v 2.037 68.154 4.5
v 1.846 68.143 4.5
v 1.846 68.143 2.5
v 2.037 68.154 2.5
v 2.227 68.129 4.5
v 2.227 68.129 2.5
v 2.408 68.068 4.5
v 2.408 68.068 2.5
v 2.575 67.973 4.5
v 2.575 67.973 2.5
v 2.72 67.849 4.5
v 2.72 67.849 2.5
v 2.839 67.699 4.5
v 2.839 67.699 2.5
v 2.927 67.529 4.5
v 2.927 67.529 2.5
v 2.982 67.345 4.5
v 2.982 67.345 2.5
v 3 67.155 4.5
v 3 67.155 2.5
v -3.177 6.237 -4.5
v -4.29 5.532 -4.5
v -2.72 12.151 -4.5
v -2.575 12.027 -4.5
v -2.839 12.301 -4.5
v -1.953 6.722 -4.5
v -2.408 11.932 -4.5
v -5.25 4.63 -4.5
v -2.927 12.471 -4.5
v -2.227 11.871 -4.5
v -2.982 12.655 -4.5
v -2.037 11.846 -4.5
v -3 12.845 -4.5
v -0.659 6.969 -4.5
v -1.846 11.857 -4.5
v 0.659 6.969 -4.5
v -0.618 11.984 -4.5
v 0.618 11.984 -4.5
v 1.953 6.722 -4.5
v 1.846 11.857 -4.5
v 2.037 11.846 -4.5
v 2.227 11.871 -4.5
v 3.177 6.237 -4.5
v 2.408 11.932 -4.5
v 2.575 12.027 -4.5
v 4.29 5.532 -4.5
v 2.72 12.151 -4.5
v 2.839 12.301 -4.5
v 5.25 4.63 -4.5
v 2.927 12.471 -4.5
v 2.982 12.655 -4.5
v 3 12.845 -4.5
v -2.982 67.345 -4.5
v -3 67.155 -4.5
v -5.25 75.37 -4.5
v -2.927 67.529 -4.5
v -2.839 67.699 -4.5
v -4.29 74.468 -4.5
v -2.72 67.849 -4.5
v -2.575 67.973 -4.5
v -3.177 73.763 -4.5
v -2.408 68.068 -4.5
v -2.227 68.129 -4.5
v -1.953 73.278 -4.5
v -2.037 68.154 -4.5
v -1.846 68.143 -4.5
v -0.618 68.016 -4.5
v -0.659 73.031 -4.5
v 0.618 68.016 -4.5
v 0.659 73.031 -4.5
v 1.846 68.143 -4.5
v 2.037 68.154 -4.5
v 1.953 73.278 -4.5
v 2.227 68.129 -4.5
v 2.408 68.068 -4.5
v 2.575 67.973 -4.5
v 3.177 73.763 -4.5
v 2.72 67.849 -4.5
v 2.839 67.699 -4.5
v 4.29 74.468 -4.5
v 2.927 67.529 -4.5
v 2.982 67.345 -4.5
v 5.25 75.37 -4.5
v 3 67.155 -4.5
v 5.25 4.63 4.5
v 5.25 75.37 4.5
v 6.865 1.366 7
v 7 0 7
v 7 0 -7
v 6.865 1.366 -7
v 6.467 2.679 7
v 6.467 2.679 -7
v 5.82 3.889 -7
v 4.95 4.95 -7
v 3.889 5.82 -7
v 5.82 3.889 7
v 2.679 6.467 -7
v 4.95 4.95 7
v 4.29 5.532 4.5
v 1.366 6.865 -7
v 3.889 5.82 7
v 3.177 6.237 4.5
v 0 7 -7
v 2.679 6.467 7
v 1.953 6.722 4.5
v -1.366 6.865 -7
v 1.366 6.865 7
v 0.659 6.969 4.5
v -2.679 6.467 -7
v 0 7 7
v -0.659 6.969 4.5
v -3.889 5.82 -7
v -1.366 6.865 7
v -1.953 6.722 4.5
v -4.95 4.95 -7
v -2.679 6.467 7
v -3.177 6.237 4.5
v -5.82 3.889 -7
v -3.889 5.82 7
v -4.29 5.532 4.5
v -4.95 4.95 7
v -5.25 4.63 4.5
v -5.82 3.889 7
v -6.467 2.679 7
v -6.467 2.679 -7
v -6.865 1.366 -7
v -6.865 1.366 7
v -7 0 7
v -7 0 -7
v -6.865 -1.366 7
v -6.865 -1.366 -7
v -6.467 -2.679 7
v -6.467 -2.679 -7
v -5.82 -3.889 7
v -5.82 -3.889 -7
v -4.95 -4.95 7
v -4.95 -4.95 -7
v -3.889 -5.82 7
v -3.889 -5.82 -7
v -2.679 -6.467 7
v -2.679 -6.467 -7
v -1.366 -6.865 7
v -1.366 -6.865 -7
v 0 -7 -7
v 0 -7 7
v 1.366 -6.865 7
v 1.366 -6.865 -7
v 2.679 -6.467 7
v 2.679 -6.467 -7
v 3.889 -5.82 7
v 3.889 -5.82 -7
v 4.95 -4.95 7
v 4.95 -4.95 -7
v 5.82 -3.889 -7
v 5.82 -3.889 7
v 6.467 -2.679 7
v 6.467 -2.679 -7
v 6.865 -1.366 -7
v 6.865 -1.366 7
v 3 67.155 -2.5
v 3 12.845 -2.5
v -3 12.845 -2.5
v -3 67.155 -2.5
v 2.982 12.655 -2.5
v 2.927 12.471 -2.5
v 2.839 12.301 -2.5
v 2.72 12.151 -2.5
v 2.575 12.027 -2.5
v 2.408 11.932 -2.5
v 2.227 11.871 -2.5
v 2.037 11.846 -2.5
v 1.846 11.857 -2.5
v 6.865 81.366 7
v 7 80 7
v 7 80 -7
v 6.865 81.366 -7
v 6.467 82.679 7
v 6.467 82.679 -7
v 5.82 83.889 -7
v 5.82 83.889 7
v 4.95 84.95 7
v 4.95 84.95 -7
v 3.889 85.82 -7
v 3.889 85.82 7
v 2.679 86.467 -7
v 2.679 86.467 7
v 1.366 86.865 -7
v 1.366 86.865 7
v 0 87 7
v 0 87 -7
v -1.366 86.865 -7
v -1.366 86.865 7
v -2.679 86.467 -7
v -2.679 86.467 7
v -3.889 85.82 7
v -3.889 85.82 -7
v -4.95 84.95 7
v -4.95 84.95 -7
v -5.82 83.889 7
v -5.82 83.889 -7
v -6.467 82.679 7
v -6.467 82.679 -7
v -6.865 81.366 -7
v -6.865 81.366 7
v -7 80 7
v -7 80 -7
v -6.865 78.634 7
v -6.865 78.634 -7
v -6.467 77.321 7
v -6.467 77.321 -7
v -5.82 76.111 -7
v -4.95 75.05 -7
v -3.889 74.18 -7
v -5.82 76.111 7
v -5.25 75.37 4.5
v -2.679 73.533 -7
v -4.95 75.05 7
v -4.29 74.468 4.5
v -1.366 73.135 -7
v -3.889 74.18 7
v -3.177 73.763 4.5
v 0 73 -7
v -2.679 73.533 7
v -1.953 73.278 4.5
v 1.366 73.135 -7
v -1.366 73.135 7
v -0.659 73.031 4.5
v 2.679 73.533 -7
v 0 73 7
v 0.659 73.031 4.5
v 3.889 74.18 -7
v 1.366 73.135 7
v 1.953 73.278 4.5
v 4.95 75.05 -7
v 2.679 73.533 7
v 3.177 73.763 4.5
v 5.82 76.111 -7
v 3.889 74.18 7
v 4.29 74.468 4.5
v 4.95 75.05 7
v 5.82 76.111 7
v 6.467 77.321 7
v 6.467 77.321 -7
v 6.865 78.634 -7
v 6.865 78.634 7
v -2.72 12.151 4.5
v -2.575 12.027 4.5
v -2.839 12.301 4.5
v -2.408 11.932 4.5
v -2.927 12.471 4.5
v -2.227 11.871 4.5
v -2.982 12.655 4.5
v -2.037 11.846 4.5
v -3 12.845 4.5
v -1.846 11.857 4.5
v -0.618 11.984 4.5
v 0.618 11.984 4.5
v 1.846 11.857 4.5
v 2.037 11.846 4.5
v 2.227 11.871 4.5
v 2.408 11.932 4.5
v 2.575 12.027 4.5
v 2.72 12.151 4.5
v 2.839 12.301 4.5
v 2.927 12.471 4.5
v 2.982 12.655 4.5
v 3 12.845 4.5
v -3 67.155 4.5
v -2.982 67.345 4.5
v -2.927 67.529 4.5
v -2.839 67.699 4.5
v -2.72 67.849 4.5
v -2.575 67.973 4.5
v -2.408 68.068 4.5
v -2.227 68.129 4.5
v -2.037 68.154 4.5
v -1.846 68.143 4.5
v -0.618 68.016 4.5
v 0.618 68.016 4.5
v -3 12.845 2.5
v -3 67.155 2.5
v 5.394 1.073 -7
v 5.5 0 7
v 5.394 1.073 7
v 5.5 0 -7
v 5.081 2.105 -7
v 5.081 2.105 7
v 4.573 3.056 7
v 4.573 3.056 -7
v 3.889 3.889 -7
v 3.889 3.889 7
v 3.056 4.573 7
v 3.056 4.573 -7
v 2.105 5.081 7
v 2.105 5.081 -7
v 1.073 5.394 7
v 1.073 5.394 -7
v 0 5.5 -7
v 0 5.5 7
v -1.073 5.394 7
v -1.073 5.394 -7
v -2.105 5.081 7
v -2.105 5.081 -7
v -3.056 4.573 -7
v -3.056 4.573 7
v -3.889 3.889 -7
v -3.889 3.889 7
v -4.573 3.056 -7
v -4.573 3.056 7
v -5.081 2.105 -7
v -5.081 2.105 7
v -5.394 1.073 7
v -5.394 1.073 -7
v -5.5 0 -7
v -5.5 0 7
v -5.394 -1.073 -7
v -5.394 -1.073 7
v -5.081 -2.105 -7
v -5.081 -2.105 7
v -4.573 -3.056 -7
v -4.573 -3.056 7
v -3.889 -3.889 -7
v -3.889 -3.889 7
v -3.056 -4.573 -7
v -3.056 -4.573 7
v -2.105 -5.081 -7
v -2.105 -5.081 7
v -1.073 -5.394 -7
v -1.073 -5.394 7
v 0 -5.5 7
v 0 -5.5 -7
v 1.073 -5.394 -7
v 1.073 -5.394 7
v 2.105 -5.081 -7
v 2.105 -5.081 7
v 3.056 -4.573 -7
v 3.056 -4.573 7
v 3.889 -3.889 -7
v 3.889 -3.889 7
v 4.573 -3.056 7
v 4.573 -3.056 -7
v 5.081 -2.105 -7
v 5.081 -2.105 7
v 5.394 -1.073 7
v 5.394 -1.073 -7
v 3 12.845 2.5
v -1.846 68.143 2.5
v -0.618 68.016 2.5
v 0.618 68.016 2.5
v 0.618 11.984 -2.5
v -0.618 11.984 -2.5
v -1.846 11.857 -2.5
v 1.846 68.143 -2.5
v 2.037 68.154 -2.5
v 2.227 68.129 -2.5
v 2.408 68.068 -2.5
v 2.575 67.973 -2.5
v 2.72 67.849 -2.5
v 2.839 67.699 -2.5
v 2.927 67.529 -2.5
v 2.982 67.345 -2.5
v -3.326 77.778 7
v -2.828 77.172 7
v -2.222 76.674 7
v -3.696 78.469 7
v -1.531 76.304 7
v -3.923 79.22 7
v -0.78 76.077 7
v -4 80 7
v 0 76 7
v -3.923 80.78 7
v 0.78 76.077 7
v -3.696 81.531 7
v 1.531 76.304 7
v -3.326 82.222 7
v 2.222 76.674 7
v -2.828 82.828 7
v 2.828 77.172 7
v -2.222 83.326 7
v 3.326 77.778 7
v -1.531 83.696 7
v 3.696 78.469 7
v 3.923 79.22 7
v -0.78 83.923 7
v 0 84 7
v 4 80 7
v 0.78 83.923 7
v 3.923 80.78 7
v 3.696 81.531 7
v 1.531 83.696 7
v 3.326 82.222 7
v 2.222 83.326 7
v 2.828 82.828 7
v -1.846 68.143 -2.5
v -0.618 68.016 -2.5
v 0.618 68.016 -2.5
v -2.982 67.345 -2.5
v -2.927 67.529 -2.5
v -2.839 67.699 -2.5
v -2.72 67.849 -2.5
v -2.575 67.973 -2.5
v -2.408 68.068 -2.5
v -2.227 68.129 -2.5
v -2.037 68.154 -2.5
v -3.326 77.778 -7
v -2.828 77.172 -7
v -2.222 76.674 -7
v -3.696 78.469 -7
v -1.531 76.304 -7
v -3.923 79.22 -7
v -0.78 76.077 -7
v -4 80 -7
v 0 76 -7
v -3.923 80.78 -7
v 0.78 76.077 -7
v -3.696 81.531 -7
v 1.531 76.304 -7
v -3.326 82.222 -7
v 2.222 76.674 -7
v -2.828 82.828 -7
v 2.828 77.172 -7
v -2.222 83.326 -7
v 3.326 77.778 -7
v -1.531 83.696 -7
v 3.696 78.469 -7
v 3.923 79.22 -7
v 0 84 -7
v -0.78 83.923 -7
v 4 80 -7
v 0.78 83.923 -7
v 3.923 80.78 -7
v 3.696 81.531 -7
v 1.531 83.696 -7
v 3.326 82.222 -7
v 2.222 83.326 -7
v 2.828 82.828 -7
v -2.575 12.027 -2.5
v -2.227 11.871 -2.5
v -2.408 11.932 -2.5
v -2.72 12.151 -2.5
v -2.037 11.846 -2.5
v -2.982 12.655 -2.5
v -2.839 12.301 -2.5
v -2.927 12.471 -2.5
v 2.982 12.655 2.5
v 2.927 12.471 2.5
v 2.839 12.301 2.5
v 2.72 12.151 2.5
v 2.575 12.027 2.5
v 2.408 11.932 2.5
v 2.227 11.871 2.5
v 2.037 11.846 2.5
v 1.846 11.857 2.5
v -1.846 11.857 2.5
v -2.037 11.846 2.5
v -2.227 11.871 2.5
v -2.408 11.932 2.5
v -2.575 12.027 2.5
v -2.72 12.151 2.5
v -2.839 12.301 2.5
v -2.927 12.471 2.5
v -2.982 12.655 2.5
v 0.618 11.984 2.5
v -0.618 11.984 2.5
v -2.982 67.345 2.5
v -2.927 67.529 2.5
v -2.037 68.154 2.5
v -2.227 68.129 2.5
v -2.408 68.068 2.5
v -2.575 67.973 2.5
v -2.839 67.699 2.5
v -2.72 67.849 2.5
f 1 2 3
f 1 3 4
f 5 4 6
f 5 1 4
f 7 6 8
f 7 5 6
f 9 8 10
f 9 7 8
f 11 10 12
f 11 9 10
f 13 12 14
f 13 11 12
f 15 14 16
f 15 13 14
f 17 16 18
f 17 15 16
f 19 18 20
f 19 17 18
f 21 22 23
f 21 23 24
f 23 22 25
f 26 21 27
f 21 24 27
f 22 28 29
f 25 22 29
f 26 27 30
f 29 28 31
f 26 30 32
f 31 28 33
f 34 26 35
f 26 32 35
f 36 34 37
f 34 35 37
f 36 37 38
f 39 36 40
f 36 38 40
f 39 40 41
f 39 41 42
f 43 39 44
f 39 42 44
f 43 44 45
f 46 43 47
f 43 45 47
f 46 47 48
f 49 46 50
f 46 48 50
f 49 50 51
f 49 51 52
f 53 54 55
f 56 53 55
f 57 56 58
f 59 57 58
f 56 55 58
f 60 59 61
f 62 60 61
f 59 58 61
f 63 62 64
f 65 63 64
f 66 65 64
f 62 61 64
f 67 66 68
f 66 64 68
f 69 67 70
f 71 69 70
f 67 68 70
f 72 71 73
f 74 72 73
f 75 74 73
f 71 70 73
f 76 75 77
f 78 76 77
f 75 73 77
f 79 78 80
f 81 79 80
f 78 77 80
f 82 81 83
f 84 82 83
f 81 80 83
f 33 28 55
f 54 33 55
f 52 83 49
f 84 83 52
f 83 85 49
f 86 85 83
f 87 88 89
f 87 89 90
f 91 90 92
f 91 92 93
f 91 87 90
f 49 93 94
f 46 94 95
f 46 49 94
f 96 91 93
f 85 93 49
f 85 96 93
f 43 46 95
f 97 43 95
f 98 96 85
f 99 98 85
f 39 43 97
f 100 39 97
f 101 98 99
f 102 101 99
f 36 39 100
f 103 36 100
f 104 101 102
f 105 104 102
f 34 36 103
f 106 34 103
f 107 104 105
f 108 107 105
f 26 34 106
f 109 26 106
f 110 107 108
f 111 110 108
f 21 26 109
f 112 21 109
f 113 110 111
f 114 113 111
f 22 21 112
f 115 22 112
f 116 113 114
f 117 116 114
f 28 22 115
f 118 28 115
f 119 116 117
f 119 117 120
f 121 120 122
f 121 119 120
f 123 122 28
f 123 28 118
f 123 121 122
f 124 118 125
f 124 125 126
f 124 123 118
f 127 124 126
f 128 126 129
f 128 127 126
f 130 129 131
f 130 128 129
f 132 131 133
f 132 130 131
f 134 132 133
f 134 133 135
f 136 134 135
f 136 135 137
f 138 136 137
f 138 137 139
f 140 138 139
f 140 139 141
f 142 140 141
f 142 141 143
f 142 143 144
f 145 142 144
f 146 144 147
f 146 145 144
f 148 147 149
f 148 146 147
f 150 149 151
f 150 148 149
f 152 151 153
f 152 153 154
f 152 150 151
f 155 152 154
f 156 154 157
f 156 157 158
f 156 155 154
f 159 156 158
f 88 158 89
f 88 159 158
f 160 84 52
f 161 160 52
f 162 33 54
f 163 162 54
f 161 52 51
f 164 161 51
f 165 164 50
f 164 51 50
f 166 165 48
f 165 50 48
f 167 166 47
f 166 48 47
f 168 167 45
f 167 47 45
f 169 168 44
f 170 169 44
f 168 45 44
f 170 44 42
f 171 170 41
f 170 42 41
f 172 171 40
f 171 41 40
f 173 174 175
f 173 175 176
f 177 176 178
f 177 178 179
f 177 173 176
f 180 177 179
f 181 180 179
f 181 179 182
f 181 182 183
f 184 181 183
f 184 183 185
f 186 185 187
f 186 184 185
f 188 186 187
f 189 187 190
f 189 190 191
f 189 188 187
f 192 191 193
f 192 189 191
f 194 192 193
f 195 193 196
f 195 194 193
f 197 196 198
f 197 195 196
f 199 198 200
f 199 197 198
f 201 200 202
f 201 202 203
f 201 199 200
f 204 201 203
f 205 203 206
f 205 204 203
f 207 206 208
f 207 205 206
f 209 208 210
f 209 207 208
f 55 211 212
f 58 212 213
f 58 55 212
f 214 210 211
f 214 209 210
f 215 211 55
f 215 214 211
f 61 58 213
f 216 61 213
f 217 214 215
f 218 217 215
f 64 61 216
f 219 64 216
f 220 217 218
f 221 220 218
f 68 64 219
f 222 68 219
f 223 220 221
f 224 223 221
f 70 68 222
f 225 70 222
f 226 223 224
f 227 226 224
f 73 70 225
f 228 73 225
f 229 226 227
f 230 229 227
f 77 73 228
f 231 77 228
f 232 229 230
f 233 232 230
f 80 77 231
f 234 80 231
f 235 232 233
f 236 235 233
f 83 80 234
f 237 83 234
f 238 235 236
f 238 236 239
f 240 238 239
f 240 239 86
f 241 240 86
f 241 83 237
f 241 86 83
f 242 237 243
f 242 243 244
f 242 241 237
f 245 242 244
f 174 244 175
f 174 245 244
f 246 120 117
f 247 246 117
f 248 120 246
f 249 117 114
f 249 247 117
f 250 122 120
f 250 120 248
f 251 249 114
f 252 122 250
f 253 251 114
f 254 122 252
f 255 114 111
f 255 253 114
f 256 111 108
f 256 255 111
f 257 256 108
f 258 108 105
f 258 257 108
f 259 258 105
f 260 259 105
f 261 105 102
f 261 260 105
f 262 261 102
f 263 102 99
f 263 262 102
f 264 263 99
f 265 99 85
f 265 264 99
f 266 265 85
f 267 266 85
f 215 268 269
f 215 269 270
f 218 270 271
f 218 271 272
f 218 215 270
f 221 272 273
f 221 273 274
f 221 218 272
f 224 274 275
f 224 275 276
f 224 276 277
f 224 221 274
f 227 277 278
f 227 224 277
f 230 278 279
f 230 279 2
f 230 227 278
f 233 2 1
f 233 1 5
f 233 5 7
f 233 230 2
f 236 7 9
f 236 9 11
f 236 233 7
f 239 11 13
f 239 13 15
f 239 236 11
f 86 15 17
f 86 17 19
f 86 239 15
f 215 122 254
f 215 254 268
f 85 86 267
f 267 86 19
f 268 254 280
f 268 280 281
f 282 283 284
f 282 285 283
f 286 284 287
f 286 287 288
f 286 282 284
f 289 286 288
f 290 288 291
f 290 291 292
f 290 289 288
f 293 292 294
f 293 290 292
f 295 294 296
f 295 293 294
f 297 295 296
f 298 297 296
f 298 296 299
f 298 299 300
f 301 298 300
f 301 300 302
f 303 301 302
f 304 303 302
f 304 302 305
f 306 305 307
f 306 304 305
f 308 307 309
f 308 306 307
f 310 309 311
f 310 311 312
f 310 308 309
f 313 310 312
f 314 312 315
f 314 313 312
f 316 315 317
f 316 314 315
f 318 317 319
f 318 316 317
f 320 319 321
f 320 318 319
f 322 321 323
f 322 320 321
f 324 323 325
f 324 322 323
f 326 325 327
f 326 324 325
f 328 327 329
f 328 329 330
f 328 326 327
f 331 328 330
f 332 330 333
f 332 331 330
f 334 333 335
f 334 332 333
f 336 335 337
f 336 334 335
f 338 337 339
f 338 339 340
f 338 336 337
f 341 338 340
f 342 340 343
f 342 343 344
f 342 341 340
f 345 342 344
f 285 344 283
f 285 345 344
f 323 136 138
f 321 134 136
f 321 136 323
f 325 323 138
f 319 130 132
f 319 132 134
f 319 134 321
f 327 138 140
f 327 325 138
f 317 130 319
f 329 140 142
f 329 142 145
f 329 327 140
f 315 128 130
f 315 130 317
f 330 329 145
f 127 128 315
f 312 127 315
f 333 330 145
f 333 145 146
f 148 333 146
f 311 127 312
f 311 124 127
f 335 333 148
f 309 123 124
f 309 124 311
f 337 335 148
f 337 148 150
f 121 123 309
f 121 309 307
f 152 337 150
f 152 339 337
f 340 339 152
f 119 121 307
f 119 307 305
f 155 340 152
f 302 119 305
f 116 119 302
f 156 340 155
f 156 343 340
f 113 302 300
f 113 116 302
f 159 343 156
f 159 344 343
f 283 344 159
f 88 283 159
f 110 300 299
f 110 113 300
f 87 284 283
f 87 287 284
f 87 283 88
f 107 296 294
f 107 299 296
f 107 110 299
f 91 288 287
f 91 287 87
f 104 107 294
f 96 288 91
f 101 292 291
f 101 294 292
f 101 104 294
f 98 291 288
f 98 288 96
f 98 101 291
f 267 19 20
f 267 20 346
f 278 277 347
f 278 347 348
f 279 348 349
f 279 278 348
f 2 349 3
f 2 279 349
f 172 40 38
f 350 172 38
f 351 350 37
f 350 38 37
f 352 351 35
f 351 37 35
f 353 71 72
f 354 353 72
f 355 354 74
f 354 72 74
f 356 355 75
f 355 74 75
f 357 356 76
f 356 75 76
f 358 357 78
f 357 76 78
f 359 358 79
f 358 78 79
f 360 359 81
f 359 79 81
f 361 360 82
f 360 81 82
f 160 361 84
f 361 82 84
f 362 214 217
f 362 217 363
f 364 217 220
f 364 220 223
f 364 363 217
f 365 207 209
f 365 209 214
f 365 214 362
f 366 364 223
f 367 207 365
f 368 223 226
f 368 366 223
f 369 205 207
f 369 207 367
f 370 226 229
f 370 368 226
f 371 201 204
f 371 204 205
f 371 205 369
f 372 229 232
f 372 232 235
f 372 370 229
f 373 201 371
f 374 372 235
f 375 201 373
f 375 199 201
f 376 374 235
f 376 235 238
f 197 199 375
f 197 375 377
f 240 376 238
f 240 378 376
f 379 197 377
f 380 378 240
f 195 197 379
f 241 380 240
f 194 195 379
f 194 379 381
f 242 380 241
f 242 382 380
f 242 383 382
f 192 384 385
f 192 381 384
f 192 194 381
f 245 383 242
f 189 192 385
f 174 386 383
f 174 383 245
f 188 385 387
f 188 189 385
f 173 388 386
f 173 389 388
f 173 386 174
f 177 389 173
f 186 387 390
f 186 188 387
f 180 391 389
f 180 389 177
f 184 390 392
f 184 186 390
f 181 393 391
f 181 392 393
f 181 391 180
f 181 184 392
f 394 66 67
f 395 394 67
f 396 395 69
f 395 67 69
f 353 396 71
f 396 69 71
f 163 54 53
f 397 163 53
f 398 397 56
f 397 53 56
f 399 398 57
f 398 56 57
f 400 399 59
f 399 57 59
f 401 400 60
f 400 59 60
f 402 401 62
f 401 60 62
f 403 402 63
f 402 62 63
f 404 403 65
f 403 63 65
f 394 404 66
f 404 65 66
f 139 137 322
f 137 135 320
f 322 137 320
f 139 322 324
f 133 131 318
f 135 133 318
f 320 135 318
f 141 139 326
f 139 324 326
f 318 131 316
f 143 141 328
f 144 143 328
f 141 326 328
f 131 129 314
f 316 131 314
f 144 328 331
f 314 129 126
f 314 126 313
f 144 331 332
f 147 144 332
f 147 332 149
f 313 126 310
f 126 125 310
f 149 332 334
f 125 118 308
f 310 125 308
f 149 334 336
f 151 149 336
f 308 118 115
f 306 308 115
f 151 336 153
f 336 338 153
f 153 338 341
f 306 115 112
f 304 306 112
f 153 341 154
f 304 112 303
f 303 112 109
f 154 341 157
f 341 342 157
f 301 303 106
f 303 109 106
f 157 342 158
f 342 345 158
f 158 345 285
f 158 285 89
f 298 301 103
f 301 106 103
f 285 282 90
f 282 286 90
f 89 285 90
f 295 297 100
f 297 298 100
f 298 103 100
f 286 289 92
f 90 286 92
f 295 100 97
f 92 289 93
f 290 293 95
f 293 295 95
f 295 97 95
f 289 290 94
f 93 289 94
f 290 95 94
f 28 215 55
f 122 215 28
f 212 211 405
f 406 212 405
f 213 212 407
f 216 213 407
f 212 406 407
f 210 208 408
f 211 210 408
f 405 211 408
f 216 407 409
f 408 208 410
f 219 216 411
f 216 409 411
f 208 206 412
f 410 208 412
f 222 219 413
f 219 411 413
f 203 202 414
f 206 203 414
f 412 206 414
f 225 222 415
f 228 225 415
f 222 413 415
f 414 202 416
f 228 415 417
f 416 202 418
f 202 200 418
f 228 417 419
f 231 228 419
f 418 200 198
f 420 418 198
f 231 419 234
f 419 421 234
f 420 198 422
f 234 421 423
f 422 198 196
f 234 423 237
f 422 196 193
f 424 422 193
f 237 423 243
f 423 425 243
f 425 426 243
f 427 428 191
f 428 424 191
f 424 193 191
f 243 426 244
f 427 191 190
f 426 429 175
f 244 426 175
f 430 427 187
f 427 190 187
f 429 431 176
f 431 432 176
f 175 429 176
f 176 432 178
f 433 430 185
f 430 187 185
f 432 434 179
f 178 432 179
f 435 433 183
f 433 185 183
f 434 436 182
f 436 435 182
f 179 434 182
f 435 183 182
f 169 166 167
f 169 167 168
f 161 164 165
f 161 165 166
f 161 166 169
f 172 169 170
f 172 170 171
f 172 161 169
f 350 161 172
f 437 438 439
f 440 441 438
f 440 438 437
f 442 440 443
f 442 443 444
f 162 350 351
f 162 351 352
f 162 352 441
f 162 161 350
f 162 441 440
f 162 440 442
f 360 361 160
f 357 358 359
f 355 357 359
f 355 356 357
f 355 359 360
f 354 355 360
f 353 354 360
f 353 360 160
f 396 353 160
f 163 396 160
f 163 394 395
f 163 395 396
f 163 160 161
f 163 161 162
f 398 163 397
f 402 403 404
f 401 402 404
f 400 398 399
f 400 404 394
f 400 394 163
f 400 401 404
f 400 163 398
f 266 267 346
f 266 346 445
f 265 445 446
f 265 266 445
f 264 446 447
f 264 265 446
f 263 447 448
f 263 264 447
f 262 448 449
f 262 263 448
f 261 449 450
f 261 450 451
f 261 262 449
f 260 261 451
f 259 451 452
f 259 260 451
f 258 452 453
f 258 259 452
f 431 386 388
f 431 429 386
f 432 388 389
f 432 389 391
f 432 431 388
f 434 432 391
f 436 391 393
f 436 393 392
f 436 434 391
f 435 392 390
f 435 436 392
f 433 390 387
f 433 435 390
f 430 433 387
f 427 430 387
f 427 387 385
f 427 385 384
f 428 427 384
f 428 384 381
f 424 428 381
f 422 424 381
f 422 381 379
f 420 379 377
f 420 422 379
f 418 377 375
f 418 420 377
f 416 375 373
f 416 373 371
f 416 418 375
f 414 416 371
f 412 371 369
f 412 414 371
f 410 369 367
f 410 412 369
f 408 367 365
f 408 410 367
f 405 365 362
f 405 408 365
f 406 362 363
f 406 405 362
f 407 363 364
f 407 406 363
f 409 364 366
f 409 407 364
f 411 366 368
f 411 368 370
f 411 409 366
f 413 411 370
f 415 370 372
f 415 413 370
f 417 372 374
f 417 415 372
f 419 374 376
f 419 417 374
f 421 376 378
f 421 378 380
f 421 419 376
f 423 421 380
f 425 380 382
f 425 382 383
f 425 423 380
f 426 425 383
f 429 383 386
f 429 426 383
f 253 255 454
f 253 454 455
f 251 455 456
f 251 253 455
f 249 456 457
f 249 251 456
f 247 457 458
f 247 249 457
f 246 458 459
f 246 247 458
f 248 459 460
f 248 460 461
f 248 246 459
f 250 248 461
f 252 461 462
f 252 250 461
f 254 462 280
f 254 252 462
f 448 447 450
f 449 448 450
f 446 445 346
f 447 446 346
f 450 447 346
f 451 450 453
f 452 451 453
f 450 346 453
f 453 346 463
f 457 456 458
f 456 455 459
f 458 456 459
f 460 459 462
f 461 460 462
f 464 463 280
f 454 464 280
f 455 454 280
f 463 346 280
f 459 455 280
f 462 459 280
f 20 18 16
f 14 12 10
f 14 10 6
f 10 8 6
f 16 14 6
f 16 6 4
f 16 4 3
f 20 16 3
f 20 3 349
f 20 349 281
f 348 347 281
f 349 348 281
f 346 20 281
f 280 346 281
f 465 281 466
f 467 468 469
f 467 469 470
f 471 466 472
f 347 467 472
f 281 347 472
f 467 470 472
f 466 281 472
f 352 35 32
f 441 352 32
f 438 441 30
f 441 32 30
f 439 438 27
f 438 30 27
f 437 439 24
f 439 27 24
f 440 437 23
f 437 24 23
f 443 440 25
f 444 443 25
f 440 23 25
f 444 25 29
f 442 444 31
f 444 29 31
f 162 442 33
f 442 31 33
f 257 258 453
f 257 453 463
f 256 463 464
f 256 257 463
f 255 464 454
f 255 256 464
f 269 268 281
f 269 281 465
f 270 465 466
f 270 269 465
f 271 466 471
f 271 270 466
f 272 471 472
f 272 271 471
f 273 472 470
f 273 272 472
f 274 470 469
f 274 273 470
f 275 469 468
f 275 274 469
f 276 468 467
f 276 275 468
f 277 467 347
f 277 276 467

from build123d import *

# Parameters (mm, degrees)
SKETCH1_R           = 7
SKETCH1_R_2         = 5.5
BOSS_EXTRUDE1_DEPTH = 7
SKETCH2_R           = 7
SKETCH2_R_2         = 4
BOSS_EXTRUDE2_DEPTH = 7
BOSS_EXTRUDE3_DEPTH = 4.5
CUT_EXTRUDE2_DEPTH  = 2


with BuildPart() as part:
    # Sketch1 → Boss-Extrude1 (new body, symmetric)
    with BuildSketch(Plane.XY):
        Circle(SKETCH1_R)
        Circle(SKETCH1_R_2, mode=Mode.SUBTRACT)
    extrude(amount=BOSS_EXTRUDE1_DEPTH, both=True)



with BuildPart() as body_2:
    # Sketch2 → Boss-Extrude2 (new body, symmetric)
    with BuildSketch(Plane.XY):
        with Locations((0, 80)):
            Circle(SKETCH2_R)
        with Locations((0, 80)):
            Circle(SKETCH2_R_2, mode=Mode.SUBTRACT)
    extrude(amount=BOSS_EXTRUDE2_DEPTH, both=True)


with BuildPart() as part_1:
    add(part.part)

    add(body_2.part)  # Boss-Extrude3 merges body 2
    # Sketch3 → Boss-Extrude3 (add, symmetric)
    with BuildSketch(Plane.XY):
        with BuildLine():
            Line((-5.25, 75.369935206), (-5.25, 4.630064794))
            ThreePointArc((-5.25, 4.630064794), (0, 7), (5.25, 4.630064794))
            Line((5.25, 4.630064794), (5.25, 75.369935206))
            ThreePointArc((5.25, 75.369935206), (0, 73), (-5.25, 75.369935206))
        make_face()
    extrude(amount=BOSS_EXTRUDE3_DEPTH, both=True)

    # Sketch4 → Cut-Extrude2 (cut)
    with BuildSketch(Plane.XY.offset(4.5)):
        with BuildLine():
            ThreePointArc((-3, 67.154767421), (-2.650443636, 67.914321947), (-1.846153846, 68.142862235))
            ThreePointArc((-1.846153846, 68.142862235), (0, 68), (1.846153846, 68.142862235))
            ThreePointArc((1.846153846, 68.142862235), (2.650443636, 67.914321947), (3, 67.154767421))
            Line((3, 67.154767421), (3, 12.845232579))
            ThreePointArc((3, 12.845232579), (2.650443636, 12.085678053), (1.846153846, 11.857137765))
            ThreePointArc((1.846153846, 11.857137765), (0, 12), (-1.846153846, 11.857137765))
            ThreePointArc((-1.846153846, 11.857137765), (-2.650443636, 12.085678053), (-3, 12.845232579))
            Line((-3, 12.845232579), (-3, 67.154767421))
        make_face()
    cut_extrude2 = extrude(amount=-CUT_EXTRUDE2_DEPTH, mode=Mode.SUBTRACT)

    # Mirror1: Cut-Extrude2 across plane
    add(cut_extrude2.mirror(Plane.XY), mode=Mode.SUBTRACT)


solid = part_1.part
